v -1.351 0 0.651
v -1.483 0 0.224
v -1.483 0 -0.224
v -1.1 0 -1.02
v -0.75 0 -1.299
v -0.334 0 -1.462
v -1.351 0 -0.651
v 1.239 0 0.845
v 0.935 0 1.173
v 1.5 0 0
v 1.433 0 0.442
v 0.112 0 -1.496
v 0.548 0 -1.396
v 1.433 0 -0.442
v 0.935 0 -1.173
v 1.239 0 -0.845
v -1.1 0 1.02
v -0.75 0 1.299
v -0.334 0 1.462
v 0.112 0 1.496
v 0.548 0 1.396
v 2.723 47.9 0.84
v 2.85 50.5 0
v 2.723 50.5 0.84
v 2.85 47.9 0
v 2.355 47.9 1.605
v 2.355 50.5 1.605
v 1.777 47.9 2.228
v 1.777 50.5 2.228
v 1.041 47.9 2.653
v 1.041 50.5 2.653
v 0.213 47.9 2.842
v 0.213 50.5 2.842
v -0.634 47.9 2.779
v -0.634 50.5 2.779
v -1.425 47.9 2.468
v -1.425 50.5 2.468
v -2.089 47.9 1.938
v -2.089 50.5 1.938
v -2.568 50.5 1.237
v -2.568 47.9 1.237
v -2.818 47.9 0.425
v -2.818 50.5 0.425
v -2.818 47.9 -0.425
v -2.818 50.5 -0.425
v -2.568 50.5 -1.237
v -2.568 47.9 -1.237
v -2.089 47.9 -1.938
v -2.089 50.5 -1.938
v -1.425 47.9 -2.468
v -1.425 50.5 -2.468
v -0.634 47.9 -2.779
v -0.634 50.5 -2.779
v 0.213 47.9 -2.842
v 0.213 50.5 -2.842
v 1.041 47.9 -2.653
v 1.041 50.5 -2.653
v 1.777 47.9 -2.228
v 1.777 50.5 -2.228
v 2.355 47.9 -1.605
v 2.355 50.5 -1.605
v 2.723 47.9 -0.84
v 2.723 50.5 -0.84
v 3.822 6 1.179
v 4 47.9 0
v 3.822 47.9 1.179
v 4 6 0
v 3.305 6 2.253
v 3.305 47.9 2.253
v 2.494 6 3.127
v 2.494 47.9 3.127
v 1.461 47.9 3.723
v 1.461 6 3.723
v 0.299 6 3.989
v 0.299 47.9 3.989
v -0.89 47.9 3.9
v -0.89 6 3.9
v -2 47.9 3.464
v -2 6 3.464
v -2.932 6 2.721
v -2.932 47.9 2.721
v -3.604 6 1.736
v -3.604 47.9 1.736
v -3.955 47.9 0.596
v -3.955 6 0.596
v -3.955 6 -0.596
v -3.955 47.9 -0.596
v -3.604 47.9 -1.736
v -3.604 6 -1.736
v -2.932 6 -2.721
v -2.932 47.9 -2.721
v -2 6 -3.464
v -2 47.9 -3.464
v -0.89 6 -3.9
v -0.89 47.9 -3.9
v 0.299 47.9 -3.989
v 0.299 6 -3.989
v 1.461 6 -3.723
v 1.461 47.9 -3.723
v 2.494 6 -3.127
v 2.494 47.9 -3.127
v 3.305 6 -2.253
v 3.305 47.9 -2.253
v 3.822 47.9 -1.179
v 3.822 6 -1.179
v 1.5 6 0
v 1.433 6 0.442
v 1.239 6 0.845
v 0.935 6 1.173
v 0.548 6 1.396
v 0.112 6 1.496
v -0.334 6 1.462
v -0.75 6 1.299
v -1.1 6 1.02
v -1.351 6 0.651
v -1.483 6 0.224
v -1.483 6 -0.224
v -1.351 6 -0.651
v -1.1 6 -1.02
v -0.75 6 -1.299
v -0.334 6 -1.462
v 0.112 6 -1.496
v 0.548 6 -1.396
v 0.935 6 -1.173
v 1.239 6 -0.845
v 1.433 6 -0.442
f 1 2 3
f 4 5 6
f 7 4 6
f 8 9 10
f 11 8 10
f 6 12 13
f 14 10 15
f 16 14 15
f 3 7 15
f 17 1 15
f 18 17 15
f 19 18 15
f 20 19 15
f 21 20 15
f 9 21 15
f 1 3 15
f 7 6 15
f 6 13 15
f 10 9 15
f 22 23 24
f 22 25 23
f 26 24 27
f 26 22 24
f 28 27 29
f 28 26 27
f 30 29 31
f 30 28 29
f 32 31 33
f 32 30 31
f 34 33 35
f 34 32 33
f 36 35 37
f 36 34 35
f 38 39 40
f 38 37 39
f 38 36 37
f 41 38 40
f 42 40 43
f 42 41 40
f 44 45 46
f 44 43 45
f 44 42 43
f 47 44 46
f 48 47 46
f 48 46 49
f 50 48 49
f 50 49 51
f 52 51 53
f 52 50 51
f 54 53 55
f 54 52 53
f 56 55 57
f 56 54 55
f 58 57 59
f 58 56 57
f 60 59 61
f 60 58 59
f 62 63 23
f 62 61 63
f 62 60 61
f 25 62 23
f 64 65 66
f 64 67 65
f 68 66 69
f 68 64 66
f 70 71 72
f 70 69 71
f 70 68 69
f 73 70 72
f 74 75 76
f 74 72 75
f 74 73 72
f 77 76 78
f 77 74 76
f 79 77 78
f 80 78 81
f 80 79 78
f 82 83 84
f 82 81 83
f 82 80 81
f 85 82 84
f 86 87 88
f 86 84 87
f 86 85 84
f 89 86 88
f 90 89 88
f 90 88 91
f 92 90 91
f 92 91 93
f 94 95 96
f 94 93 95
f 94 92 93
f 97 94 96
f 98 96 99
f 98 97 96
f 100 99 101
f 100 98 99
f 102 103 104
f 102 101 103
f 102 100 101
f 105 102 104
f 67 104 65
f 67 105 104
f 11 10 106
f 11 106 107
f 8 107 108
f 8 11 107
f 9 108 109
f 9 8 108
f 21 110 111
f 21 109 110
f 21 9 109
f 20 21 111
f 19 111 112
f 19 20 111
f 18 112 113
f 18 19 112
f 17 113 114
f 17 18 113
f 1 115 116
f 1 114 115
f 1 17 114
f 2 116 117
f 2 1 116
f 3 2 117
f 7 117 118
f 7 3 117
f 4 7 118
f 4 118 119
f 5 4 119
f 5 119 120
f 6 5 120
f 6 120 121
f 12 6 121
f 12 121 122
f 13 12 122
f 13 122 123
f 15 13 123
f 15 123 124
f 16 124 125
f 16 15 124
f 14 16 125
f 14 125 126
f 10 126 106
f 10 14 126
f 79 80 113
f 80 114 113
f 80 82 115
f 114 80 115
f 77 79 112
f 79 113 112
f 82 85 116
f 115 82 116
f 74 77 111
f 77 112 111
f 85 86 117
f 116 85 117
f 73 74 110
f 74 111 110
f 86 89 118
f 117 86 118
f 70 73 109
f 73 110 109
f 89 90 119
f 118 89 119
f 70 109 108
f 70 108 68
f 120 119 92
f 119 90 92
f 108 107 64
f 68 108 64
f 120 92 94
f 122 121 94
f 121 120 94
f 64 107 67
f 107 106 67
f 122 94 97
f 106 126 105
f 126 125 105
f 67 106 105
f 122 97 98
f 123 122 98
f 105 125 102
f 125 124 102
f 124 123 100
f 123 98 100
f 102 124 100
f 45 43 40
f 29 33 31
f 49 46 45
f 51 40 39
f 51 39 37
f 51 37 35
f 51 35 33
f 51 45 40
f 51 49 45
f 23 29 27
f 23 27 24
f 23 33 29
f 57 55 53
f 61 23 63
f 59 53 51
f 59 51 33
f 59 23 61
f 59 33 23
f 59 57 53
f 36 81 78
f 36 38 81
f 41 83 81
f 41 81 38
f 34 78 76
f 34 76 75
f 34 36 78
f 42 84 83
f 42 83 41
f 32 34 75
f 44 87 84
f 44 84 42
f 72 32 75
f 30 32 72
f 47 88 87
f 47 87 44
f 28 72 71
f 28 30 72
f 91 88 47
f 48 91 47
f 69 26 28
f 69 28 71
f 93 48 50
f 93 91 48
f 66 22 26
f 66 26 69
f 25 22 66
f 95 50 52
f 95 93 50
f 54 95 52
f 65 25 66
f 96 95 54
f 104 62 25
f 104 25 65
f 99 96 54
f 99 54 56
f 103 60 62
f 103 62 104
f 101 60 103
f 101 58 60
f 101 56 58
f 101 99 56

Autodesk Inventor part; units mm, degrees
ref_plane "YZ Plane" through (0, 0, 0) normal (1, 0, 0) x (0, 1, 0)
ref_plane "XZ Plane" through (0, 0, 0) normal (0, 1, 0) x (-1, 0, 0)
ref_plane "XY Plane" through (0, 0, 0) normal (0, 0, 1) x (1, 0, 0)
sketch "Sketch1" plane through (0, 0, 0) normal (0, 0, 1) x (1, 0, 0)
  line L0 (0, 0) -> (0, 50.5)
  line L1 (0, 50.5) -> (2.85, 50.5)
  line L2 (2.85, 50.5) -> (2.85, 47.9)
  line L3 (2.85, 47.9) -> (4, 47.9)
  line L4 (4, 47.9) -> (4, 6)
  line L5 (4, 6) -> (1.5, 6)
  line L6 (1.5, 6) -> (1.5, 0)
  line L7 (1.5, 0) -> (0, 0)
  dimension "d0" = 3
  dimension "d1" = 6
  dimension "d2" = 50.5
  dimension "d3" = 5.7
  dimension "d4" = 8
  dimension "d5" = 2.6
revolve "Revolution1" add sketch "Sketch1" angle 360 about axis through (0, 0, 0) along (0, 1, 0)
properties part number "Pok X-Carriage Top Support" material "ABS Plastic"
